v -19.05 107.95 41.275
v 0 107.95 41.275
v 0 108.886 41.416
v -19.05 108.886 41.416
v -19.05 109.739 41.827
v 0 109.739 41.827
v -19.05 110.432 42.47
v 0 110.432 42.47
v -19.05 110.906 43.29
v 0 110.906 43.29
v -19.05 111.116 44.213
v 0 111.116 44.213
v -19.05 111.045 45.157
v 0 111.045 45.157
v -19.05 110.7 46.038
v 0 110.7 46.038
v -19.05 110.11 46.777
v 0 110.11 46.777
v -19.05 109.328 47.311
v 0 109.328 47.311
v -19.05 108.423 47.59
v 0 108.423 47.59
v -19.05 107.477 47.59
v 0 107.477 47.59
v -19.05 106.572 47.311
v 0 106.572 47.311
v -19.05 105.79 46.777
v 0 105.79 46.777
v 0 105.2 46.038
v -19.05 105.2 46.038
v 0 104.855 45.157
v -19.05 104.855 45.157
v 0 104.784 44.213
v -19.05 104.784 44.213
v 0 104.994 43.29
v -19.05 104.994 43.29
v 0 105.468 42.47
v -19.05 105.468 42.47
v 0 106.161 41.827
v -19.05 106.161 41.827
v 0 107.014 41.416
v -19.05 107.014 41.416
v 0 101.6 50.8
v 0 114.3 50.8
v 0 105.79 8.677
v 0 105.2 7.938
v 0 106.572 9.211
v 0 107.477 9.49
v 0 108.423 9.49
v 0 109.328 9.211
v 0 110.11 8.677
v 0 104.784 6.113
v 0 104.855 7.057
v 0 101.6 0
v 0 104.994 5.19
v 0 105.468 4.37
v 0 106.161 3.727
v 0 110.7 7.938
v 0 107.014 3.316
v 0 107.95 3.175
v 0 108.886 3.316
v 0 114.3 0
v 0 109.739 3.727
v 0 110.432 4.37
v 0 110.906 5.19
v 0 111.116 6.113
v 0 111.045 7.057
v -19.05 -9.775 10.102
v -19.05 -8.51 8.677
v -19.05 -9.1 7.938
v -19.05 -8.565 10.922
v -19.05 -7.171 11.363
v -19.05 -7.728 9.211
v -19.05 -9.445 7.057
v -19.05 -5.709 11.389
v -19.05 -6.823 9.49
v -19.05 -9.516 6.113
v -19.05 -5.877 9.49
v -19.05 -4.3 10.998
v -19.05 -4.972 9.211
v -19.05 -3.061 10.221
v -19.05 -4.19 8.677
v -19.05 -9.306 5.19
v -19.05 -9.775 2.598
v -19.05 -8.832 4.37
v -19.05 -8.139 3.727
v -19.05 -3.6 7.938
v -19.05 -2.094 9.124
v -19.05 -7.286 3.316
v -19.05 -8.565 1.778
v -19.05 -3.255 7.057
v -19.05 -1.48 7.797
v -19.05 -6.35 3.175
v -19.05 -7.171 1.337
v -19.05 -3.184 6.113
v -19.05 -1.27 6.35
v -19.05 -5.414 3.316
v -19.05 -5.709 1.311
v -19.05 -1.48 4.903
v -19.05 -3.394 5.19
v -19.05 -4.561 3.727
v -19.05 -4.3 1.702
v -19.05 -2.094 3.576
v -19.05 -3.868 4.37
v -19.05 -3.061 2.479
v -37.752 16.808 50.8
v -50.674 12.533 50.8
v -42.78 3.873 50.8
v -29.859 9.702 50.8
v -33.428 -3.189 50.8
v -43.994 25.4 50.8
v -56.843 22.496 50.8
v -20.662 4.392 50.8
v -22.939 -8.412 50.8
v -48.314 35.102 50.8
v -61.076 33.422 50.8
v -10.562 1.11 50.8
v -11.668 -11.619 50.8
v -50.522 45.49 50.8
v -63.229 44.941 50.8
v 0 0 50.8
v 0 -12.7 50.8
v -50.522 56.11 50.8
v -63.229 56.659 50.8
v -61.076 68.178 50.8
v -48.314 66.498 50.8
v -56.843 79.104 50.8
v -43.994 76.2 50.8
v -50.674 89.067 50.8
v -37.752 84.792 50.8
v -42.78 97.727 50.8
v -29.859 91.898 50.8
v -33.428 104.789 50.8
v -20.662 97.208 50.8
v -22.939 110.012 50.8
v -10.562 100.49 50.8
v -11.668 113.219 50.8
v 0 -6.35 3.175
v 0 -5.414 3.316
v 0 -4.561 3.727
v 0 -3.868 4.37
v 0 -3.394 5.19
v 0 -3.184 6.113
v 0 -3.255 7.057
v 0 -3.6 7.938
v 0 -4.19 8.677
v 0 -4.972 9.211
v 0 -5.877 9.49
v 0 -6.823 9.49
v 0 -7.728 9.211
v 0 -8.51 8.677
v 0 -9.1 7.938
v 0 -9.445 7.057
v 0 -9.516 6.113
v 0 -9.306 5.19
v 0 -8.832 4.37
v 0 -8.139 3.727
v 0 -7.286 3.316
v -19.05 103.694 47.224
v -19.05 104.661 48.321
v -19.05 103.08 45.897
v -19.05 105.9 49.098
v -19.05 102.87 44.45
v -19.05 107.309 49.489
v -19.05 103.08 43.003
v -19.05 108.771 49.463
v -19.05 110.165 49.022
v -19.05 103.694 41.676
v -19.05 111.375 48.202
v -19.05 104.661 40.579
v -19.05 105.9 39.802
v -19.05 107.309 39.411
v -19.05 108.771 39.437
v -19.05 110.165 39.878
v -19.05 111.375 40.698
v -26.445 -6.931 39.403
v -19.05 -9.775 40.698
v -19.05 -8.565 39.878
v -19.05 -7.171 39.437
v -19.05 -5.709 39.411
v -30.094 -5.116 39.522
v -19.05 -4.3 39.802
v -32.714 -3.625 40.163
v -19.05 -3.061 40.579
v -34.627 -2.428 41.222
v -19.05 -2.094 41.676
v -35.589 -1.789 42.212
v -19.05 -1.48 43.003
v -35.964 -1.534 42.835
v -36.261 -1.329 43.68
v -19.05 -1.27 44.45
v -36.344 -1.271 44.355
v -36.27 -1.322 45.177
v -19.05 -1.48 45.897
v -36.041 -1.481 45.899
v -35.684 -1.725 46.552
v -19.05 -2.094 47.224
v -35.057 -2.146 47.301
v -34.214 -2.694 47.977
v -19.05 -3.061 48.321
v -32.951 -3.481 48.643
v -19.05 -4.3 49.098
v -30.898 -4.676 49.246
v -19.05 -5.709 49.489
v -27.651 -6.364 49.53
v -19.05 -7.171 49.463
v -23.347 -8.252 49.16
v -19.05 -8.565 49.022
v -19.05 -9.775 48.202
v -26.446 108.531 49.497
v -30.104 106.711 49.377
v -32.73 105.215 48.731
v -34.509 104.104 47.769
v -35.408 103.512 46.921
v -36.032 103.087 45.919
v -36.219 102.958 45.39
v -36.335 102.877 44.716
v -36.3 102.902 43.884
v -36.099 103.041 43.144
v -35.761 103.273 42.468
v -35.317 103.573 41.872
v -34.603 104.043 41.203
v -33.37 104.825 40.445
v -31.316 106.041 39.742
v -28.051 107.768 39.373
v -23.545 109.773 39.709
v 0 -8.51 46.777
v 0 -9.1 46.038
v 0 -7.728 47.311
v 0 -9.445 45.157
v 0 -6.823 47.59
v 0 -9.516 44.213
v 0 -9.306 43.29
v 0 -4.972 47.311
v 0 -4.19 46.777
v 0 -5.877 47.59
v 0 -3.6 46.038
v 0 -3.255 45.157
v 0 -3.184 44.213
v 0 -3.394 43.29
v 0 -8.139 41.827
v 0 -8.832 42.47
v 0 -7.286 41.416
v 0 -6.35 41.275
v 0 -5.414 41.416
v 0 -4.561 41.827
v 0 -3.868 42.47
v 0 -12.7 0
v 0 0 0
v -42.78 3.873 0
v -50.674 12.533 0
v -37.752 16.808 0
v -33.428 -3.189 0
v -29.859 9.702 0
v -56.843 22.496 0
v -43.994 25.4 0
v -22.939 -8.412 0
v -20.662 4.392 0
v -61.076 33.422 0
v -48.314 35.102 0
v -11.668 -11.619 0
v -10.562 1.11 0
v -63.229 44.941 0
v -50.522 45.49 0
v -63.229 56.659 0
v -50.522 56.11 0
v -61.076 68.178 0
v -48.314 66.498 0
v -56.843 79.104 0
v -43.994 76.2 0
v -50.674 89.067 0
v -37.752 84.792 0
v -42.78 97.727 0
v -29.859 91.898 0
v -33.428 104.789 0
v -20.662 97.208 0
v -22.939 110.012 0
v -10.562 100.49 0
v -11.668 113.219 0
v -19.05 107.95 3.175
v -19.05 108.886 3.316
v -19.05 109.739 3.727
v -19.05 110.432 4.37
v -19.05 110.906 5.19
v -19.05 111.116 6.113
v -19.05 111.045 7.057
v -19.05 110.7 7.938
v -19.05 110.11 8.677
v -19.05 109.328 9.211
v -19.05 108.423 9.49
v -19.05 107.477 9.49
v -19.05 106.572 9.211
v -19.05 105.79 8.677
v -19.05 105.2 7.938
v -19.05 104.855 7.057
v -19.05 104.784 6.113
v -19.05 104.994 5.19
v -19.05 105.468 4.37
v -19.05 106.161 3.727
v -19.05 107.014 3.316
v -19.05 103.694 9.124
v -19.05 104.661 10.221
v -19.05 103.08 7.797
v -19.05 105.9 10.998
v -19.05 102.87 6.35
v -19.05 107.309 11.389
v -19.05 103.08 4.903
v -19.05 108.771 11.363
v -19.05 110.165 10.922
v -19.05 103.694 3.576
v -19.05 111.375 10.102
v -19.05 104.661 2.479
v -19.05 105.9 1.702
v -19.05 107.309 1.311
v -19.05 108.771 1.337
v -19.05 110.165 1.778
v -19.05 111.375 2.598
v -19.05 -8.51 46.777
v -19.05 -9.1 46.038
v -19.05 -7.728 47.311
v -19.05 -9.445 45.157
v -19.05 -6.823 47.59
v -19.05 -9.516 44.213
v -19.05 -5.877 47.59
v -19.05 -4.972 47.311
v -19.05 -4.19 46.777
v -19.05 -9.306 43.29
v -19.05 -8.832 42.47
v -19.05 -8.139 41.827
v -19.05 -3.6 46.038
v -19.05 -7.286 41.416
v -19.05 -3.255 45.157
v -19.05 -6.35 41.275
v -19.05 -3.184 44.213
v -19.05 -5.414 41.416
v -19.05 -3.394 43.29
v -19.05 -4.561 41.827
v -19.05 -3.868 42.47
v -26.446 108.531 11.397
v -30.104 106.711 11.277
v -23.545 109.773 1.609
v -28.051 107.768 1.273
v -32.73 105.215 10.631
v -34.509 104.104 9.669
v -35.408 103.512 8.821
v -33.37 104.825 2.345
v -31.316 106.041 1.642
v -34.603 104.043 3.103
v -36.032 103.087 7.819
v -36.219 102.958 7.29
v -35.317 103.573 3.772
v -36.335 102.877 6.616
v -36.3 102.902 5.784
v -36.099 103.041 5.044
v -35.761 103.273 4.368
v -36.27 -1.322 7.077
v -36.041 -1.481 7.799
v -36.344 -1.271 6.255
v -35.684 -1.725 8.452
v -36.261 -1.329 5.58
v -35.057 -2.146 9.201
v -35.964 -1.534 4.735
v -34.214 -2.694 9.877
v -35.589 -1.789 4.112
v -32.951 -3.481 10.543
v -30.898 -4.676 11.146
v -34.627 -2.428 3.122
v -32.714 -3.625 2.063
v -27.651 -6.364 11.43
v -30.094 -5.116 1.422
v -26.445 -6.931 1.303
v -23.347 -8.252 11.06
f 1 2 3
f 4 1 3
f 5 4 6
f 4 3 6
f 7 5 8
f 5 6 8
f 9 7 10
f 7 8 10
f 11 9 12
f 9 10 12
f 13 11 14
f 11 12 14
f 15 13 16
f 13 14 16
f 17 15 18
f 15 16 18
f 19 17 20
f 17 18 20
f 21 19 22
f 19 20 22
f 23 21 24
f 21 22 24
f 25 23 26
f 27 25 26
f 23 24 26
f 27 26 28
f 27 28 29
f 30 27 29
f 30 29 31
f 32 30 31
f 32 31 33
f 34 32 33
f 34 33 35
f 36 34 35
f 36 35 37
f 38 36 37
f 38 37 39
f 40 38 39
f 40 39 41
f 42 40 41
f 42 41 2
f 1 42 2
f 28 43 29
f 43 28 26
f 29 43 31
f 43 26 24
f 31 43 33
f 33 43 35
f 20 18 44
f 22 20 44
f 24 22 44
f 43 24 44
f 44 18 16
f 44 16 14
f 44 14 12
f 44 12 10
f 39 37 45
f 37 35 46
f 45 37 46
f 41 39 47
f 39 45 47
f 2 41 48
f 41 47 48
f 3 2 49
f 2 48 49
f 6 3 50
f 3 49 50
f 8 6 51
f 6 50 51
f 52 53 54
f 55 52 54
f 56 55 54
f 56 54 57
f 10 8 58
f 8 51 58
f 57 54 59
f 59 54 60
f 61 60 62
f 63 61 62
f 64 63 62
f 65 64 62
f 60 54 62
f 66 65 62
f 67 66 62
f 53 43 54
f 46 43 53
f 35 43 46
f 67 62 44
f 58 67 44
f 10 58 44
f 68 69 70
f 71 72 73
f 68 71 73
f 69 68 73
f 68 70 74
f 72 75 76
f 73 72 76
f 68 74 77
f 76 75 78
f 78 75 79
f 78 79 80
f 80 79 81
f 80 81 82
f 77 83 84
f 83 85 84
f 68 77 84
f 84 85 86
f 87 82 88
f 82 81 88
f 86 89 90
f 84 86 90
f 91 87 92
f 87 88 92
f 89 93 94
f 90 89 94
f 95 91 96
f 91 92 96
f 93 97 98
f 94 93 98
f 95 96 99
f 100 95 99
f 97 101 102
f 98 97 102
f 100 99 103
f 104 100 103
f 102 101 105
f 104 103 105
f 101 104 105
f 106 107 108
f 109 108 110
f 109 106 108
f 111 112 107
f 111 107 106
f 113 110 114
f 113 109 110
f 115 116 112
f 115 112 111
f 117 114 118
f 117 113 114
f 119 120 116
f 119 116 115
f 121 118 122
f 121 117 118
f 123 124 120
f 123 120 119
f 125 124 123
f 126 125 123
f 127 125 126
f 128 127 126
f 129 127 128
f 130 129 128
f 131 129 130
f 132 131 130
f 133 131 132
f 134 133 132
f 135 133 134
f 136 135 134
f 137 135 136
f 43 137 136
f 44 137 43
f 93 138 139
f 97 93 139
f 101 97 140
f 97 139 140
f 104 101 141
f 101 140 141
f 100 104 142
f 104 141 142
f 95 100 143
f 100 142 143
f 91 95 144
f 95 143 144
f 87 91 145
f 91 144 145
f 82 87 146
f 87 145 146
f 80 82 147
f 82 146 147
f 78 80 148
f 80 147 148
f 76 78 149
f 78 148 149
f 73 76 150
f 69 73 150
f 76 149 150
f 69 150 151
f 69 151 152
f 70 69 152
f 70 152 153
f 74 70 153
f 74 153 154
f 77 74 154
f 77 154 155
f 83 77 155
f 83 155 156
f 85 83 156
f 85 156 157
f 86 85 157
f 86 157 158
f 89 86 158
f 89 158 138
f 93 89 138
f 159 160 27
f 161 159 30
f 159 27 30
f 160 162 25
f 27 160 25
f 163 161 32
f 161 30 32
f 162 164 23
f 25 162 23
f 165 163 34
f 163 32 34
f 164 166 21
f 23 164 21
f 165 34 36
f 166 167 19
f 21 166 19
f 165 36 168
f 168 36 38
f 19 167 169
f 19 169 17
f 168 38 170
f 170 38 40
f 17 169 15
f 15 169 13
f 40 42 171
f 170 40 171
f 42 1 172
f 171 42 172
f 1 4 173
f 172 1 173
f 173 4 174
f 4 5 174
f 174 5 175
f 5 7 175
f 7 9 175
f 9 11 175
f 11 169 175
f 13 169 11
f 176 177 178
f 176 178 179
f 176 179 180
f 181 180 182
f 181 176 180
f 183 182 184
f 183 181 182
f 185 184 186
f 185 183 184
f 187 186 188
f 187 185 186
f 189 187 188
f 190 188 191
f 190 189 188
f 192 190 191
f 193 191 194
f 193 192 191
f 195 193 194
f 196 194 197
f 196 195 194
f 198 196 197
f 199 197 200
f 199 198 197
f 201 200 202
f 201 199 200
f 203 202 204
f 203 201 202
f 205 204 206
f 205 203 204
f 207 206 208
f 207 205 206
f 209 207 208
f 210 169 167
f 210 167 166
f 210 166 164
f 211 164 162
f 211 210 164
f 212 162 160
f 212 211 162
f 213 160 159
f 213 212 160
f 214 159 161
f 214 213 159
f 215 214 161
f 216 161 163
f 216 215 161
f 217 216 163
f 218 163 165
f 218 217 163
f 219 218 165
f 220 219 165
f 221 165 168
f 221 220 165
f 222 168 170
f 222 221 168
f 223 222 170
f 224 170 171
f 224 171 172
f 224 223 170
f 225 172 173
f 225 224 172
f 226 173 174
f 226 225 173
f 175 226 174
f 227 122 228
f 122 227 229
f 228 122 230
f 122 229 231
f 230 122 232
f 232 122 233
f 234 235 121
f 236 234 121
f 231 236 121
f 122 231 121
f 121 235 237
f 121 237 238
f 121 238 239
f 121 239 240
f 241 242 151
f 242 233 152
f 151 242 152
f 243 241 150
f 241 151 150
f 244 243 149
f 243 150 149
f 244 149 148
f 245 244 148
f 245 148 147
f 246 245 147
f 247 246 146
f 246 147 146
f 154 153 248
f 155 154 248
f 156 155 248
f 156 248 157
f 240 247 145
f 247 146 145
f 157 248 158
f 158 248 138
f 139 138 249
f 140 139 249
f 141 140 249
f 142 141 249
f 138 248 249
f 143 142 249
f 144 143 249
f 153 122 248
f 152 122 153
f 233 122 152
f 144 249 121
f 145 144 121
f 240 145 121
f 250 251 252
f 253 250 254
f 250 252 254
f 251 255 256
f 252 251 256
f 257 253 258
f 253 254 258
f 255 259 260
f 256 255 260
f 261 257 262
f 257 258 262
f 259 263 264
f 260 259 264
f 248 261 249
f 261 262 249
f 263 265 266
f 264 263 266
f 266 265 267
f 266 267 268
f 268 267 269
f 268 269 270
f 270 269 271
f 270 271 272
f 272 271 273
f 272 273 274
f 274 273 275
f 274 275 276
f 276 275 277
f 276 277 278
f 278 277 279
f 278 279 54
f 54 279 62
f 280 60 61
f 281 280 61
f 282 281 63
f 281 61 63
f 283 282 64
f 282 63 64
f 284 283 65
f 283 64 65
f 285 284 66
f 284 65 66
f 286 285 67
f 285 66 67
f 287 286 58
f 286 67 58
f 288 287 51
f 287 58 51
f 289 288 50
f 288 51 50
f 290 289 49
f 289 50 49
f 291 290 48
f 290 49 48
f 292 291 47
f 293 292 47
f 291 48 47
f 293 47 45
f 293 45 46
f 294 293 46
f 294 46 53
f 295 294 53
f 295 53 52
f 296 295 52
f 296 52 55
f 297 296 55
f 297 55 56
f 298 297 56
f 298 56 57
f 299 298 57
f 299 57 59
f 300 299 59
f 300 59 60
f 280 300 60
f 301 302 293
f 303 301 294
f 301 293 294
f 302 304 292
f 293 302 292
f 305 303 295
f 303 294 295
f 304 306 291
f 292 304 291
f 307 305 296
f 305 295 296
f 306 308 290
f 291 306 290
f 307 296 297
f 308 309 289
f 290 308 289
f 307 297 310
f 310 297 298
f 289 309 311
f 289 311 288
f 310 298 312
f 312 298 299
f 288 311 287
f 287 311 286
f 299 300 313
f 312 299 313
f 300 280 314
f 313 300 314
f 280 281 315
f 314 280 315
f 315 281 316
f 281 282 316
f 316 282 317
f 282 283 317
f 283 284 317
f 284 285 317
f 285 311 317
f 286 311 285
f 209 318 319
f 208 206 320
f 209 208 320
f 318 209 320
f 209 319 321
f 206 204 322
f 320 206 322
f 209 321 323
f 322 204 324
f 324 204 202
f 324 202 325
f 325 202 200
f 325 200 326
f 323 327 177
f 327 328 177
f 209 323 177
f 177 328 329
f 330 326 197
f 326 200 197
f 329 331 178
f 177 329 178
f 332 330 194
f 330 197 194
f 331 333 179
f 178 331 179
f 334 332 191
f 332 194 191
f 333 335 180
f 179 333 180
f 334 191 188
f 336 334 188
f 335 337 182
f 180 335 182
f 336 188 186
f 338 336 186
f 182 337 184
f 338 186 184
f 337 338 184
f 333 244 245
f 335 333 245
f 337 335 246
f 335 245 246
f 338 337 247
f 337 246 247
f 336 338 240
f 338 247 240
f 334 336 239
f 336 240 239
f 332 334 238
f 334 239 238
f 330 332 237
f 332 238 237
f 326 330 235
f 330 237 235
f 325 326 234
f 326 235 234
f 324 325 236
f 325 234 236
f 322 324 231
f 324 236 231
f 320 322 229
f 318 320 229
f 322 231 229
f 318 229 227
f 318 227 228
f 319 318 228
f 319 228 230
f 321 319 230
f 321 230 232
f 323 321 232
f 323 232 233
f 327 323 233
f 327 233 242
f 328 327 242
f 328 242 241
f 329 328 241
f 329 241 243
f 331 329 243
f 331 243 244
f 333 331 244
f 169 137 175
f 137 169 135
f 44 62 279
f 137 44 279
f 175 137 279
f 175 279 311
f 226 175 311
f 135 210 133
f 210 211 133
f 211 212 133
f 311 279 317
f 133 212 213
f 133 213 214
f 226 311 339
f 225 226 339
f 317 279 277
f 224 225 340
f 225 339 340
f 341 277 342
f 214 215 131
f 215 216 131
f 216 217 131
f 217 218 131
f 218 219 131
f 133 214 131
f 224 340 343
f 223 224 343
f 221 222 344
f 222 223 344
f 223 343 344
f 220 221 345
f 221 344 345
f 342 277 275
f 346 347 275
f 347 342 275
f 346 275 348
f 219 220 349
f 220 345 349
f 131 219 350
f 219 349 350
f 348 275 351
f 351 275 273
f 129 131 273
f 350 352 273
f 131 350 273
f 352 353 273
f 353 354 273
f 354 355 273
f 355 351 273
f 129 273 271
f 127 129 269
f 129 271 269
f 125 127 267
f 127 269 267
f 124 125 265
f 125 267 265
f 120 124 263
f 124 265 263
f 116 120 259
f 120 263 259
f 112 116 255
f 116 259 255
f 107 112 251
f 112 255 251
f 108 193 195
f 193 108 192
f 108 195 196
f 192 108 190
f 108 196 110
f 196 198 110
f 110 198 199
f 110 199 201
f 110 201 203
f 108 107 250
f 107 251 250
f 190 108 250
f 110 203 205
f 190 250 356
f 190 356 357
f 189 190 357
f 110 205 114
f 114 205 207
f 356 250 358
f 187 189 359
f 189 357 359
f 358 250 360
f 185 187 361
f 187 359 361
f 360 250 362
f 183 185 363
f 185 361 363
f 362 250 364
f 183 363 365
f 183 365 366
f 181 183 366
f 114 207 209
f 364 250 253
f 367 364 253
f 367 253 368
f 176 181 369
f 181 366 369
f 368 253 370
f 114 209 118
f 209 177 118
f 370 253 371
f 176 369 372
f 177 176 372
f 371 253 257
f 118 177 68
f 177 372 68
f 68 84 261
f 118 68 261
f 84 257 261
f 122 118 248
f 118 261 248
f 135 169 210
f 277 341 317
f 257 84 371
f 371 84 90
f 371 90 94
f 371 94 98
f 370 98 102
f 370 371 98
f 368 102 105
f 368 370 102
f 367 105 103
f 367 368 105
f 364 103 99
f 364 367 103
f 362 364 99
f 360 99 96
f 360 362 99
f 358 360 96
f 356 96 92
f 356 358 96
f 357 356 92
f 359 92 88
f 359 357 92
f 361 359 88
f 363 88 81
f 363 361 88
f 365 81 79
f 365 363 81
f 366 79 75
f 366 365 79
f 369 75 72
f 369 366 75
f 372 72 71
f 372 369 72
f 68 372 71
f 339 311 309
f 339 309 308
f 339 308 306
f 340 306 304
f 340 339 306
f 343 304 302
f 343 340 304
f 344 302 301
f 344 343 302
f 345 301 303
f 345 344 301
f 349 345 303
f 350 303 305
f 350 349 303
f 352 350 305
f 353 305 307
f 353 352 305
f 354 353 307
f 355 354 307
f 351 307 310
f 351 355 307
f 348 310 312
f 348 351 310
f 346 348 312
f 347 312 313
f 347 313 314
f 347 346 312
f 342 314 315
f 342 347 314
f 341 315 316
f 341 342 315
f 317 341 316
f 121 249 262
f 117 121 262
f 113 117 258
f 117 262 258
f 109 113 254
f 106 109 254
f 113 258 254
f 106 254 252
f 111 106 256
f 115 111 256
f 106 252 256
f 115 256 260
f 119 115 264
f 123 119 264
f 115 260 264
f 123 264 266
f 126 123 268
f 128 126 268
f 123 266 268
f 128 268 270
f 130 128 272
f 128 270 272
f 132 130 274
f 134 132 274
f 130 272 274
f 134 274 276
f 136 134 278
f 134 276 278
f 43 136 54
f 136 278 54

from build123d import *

# Parameters (mm, degrees)
BOSS_EXTRUDE1_DEPTH = 50.8
SKETCH2_R           = 3.175
CUT_EXTRUDE1_DEPTH  = 64.5
SKETCH3_R           = 5.08
CUT_EXTRUDE2_DEPTH  = 19.05


with BuildPart() as part:
    # Sketch1 → Boss-Extrude1 (new body)
    with BuildSketch(Plane.XY):
        with BuildLine():
            Line((0, 101.6), (0, 114.3))
            ThreePointArc((0, 114.3), (-63.5, 50.8), (0, -12.7))
            Line((0, -12.7), (0, 0))
            ThreePointArc((0, 0), (-50.8, 50.8), (0, 101.6))
        make_face()
    extrude(amount=BOSS_EXTRUDE1_DEPTH)

    # Sketch2 → Cut-Extrude1 (cut, through all)
    with BuildSketch(Plane(origin=(0, 0, 0), x_dir=(0, 0, -1), z_dir=(1, 0, 0))):
        with Locations((-44.45, 107.95)):
            Circle(SKETCH2_R)
        with Locations((-6.35, 107.95)):
            Circle(SKETCH2_R)
        with Locations((-6.35, -6.35)):
            Circle(SKETCH2_R)
        with Locations((-44.45, -6.35)):
            Circle(SKETCH2_R)
    extrude(amount=-CUT_EXTRUDE1_DEPTH, mode=Mode.SUBTRACT)

    # Sketch3 → Cut-Extrude2 (cut)
    with BuildSketch(Plane(origin=(-38.1, 0, 0), x_dir=(0, 0, -1), z_dir=(1, 0, 0))):
        with Locations((-44.45, 107.95)):
            Circle(SKETCH3_R)
        with Locations((-6.35, 107.95)):
            Circle(SKETCH3_R)
        with Locations((-6.35, -6.35)):
            Circle(SKETCH3_R)
        with Locations((-44.45, -6.35)):
            Circle(SKETCH3_R)
    extrude(amount=CUT_EXTRUDE2_DEPTH, mode=Mode.SUBTRACT)


solid = part.part
